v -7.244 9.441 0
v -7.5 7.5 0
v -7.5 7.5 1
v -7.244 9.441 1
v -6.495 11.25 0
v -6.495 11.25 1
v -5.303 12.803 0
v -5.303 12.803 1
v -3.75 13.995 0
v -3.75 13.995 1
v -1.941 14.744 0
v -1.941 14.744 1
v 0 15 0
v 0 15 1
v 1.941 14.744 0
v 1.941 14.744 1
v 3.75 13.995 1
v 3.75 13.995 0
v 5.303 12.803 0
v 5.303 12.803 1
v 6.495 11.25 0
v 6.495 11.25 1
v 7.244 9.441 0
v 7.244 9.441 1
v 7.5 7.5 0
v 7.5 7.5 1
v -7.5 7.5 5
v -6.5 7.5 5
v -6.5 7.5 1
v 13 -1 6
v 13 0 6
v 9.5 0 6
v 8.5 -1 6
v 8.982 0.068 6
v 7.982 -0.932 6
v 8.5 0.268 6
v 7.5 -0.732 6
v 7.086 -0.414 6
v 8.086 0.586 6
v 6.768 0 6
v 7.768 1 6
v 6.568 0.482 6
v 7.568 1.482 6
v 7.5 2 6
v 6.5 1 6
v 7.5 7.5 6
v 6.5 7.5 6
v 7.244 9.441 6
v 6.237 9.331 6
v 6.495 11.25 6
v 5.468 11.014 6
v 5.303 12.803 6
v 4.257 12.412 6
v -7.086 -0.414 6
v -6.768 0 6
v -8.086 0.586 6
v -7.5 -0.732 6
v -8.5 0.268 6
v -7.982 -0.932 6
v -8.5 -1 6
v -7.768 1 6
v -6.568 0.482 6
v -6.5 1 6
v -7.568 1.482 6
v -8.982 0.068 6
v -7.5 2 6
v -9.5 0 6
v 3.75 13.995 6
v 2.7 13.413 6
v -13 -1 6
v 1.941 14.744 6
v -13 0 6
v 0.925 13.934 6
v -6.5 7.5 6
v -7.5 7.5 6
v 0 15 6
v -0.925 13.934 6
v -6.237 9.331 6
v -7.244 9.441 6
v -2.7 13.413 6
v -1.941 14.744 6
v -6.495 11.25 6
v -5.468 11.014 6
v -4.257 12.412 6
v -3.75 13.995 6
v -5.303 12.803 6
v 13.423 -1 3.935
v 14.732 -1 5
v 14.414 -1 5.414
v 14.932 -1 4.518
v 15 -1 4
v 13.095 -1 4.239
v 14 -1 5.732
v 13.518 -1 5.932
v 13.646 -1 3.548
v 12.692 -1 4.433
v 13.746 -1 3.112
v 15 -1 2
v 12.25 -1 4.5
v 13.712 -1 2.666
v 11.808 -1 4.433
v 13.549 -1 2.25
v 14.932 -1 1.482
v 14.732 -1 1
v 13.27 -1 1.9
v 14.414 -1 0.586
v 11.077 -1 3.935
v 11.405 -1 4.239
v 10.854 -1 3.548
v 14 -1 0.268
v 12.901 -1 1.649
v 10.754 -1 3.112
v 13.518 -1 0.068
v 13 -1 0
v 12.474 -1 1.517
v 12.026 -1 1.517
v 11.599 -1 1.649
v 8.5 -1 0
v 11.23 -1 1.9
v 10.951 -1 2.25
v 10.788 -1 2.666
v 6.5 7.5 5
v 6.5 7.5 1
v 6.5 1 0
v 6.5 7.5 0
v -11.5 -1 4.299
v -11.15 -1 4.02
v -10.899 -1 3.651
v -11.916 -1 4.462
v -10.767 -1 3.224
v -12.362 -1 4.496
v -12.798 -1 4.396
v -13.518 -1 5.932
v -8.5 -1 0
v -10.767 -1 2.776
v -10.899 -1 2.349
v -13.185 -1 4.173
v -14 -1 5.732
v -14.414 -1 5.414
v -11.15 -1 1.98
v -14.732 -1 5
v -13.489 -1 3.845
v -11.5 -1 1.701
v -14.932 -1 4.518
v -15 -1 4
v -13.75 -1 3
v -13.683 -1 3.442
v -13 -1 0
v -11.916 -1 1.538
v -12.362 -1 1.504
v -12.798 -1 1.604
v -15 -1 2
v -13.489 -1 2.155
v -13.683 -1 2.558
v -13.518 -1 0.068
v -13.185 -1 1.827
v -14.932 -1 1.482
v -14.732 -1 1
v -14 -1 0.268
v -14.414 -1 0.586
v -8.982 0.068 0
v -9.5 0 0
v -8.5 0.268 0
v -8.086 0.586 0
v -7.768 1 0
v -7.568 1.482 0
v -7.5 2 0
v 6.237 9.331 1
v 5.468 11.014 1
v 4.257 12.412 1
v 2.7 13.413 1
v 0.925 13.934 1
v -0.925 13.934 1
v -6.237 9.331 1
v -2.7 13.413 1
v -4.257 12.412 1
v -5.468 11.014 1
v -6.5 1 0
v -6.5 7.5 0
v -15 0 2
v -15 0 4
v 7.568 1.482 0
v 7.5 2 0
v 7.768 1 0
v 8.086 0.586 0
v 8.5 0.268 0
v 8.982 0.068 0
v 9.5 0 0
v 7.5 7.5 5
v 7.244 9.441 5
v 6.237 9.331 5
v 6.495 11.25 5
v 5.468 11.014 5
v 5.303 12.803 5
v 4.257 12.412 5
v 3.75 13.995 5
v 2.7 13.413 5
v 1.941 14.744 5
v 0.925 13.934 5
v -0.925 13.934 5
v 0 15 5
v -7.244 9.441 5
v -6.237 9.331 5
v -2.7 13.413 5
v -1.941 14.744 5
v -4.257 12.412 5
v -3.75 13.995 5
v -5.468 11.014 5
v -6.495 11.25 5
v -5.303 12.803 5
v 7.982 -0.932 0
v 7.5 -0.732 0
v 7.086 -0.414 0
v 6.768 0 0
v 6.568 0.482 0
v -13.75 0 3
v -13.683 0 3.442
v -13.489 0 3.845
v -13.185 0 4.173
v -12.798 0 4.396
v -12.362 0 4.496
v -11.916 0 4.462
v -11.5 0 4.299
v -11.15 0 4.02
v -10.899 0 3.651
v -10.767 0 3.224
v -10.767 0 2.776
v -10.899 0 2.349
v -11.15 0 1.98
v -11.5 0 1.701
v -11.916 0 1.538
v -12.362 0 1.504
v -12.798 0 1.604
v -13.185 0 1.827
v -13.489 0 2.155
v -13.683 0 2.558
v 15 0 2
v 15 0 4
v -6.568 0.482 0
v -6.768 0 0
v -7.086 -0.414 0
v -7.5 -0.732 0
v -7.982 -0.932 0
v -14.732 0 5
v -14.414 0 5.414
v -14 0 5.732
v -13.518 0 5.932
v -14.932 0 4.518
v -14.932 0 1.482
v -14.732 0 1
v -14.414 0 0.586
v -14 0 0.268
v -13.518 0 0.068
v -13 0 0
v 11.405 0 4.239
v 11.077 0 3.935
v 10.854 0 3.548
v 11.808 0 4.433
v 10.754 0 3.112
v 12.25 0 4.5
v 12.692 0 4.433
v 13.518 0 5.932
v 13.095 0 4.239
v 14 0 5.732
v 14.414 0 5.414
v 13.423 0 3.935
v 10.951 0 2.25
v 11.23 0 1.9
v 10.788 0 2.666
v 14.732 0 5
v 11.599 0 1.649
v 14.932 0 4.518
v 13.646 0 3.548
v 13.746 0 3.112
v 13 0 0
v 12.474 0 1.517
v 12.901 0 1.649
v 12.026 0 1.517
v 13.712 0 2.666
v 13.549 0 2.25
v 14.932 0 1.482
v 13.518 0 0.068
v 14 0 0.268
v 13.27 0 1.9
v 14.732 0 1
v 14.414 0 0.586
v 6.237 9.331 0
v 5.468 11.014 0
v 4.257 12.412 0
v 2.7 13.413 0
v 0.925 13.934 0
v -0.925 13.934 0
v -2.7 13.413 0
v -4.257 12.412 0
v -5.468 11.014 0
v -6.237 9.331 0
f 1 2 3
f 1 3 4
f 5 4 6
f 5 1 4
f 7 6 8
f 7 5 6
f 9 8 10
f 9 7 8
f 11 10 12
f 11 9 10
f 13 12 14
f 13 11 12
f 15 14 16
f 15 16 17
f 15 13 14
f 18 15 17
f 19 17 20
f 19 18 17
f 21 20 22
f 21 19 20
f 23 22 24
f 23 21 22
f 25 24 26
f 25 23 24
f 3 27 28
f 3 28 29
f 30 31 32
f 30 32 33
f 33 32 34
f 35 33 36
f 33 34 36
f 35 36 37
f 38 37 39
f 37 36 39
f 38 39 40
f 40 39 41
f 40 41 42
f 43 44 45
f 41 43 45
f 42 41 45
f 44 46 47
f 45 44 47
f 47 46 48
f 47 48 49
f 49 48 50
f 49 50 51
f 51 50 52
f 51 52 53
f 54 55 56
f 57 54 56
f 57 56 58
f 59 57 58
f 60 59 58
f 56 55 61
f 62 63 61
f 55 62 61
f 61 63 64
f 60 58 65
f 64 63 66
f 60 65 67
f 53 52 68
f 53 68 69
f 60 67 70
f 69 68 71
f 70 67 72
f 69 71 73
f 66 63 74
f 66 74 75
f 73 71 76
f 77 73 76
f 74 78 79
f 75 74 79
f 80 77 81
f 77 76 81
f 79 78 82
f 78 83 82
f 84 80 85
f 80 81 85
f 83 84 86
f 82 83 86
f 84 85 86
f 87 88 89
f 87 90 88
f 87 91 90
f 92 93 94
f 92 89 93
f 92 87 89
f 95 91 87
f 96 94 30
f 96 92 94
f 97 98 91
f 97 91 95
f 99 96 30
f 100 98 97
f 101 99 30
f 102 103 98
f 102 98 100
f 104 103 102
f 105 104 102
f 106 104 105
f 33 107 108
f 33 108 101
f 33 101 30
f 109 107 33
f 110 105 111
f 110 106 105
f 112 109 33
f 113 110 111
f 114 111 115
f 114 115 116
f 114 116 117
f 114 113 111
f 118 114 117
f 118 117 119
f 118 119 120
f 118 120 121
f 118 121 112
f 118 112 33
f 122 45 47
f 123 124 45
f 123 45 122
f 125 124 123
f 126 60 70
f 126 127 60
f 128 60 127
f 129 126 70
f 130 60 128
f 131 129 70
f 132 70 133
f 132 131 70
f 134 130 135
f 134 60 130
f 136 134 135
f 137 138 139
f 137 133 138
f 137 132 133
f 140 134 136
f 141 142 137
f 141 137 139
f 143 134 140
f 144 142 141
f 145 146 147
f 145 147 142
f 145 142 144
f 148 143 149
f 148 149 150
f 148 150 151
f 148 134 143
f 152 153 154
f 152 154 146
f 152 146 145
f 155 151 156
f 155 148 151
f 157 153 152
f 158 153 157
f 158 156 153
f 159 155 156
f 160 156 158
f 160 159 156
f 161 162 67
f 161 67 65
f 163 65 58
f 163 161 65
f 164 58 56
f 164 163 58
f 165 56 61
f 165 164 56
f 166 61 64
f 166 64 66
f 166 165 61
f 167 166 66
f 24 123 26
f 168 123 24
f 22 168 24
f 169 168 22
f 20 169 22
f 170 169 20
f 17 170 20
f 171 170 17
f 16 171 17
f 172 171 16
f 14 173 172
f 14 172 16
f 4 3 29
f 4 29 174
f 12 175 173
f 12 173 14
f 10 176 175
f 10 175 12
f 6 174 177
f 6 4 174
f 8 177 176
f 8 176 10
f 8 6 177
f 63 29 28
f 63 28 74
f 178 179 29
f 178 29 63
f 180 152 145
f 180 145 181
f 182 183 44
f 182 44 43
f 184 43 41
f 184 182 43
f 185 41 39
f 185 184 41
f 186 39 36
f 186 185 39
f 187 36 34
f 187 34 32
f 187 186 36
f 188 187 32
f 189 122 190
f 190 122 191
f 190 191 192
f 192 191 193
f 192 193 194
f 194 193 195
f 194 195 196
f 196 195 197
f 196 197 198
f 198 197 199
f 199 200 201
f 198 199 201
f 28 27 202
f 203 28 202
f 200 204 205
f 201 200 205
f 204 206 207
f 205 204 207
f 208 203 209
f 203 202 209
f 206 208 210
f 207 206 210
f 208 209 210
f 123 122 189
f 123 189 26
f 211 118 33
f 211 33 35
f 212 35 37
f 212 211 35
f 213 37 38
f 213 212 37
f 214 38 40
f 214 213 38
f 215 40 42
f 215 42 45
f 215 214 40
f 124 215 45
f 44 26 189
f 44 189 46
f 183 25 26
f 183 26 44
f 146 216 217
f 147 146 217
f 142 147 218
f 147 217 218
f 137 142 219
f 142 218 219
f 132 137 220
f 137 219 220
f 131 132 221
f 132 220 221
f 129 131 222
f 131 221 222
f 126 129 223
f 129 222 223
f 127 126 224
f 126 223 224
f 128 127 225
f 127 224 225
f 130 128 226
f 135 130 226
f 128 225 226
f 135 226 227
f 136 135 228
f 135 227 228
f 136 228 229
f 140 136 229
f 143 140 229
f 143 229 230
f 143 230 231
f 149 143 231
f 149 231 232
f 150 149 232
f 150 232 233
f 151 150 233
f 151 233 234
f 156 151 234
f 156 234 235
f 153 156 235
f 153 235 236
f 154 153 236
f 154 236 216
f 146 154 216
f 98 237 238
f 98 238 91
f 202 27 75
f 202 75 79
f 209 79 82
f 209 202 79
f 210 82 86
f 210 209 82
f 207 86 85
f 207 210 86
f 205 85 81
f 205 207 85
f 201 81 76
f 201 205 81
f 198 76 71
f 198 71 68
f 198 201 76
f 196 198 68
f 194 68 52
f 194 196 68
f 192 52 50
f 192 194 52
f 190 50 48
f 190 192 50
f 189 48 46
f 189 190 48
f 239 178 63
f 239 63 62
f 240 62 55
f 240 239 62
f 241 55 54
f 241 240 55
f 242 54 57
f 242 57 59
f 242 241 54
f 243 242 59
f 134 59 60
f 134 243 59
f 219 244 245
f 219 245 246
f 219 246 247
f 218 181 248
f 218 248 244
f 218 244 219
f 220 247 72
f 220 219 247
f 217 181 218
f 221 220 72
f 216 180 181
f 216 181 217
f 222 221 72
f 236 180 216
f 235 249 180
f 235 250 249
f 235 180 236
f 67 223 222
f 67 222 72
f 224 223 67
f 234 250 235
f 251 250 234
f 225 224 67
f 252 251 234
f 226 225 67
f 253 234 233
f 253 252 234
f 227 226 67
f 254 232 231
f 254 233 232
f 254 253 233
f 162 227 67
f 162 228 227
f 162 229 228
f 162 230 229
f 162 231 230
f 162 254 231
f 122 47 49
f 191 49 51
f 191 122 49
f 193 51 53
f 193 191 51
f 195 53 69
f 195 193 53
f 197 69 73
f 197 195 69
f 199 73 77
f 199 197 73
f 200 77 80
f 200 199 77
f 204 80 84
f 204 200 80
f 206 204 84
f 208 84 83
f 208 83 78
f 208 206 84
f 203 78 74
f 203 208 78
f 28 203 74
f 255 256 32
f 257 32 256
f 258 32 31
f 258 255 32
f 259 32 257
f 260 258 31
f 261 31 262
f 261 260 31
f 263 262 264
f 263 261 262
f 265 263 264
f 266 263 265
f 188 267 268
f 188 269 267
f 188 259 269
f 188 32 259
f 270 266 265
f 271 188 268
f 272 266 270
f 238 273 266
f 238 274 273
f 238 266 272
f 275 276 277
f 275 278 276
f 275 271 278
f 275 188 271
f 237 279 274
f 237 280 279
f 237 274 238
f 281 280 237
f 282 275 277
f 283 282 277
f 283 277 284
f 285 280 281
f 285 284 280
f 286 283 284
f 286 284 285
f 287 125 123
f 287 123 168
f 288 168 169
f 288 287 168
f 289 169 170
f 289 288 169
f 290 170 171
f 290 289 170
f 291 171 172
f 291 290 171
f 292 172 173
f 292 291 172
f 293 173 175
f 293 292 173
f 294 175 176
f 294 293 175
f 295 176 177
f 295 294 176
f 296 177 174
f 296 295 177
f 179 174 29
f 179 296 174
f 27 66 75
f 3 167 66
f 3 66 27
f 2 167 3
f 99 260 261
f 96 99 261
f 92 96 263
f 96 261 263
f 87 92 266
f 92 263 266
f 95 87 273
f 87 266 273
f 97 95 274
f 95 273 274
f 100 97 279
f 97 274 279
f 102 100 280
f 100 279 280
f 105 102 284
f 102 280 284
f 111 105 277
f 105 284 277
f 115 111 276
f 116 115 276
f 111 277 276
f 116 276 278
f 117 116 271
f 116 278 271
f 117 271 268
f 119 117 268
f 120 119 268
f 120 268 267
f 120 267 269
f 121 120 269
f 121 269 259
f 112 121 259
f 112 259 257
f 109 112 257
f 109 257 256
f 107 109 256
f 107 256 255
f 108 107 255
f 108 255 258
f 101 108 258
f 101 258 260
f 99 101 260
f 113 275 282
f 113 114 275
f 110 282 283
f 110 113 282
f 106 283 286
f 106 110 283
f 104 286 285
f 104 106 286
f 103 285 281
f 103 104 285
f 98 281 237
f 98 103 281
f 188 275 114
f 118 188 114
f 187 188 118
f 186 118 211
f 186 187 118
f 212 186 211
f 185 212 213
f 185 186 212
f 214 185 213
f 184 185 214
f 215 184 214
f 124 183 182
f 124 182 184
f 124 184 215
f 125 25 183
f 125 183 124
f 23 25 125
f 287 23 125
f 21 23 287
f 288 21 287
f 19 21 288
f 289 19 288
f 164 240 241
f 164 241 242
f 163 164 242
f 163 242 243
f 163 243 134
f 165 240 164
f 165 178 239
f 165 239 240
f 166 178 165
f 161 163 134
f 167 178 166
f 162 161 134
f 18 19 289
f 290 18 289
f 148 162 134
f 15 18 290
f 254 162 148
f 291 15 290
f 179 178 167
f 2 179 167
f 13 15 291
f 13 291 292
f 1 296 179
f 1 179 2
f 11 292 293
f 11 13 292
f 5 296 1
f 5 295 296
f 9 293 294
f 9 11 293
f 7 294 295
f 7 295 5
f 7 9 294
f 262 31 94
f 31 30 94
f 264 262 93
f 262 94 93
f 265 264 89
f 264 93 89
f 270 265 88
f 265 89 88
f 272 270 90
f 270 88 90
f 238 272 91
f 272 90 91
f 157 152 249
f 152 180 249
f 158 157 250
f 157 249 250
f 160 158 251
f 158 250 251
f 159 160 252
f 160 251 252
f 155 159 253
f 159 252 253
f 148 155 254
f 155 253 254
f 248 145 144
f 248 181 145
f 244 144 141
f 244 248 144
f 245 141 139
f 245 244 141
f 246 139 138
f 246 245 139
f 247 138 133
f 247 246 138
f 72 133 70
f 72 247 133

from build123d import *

# Parameters (mm, degrees)
BOSS_EXTRUDE1_DEPTH     = 6
SKETCH2_R               = 1.5
CUT_EXTRUDE1_DEPTH      = 6
CUT_EXTRUDE2_DEPTH      = 12
CUT_EXTRUDE2_DEPTH_BACK = 17
SKETCH3_W               = 4
SKETCH3_H               = 10
FILLET1_R               = 2


with BuildPart() as part:
    # Sketch1 → Boss-Extrude1 (new body)
    with BuildSketch(Plane.XY):
        with BuildLine():
            Line((-15, 0), (-9.5, 0))
            ThreePointArc((-9.5, 0), (-8.085786438, 0.585786438), (-7.5, 2))
            Line((-7.5, 2), (-7.5, 7.5))
            ThreePointArc((-7.5, 7.5), (0, 15), (7.5, 7.5))
            Line((7.5, 7.5), (7.5, 2))
            ThreePointArc((7.5, 2), (8.085786438, 0.585786438), (9.5, 0))
            Line((9.5, 0), (15, 0))
            Line((15, 0), (15, -1))
            Line((15, -1), (8.5, -1))
            ThreePointArc((8.5, -1), (7.085786438, -0.414213562), (6.5, 1))
            Line((6.5, 1), (6.5, 7.5))
            ThreePointArc((6.5, 7.5), (0, 14), (-6.5, 7.5))
            Line((-6.5, 7.5), (-6.5, 1))
            ThreePointArc((-6.5, 1), (-7.085786438, -0.414213562), (-8.5, -1))
            Line((-8.5, -1), (-15, -1))
            Line((-15, -1), (-15, 0))
        make_face()
    extrude(amount=BOSS_EXTRUDE1_DEPTH)

    # Sketch2 → Cut-Extrude1 (cut)
    with BuildSketch(Plane(origin=(0, 0, 0), x_dir=(1, 0, 0), z_dir=(0, 1, 0))):
        with Locations(Location((12.25, -3, 0), (0, 0, 270))):
            Circle(SKETCH2_R)
        with Locations(Location((-12.25, -3, 0), (0, 0, 180))):
            Circle(SKETCH2_R)
    extrude(amount=-CUT_EXTRUDE1_DEPTH, mode=Mode.SUBTRACT)

    # Sketch3 → Cut-Extrude2 (cut, two sides: drawn at the far end of the back side and taken through both)
    with BuildSketch(Plane(origin=(0, 0, 0), x_dir=(0, 0, -1), z_dir=(1, 0, 0)).offset(-CUT_EXTRUDE2_DEPTH_BACK)):
        with Locations((-3, 12.5)):
            Rectangle(SKETCH3_W, SKETCH3_H)
    extrude(amount=CUT_EXTRUDE2_DEPTH + CUT_EXTRUDE2_DEPTH_BACK, mode=Mode.SUBTRACT)

    # Fillet1
    fillet1_edges = [part.edges().sort_by_distance(p)[0] for p in [
        (15, -0.5, 0),
        (-15, -0.5, 0),
        (15, -0.5, 6),
        (-15, -0.5, 6),
    ]]
    fillet(fillet1_edges, radius=FILLET1_R)


solid = part.part
